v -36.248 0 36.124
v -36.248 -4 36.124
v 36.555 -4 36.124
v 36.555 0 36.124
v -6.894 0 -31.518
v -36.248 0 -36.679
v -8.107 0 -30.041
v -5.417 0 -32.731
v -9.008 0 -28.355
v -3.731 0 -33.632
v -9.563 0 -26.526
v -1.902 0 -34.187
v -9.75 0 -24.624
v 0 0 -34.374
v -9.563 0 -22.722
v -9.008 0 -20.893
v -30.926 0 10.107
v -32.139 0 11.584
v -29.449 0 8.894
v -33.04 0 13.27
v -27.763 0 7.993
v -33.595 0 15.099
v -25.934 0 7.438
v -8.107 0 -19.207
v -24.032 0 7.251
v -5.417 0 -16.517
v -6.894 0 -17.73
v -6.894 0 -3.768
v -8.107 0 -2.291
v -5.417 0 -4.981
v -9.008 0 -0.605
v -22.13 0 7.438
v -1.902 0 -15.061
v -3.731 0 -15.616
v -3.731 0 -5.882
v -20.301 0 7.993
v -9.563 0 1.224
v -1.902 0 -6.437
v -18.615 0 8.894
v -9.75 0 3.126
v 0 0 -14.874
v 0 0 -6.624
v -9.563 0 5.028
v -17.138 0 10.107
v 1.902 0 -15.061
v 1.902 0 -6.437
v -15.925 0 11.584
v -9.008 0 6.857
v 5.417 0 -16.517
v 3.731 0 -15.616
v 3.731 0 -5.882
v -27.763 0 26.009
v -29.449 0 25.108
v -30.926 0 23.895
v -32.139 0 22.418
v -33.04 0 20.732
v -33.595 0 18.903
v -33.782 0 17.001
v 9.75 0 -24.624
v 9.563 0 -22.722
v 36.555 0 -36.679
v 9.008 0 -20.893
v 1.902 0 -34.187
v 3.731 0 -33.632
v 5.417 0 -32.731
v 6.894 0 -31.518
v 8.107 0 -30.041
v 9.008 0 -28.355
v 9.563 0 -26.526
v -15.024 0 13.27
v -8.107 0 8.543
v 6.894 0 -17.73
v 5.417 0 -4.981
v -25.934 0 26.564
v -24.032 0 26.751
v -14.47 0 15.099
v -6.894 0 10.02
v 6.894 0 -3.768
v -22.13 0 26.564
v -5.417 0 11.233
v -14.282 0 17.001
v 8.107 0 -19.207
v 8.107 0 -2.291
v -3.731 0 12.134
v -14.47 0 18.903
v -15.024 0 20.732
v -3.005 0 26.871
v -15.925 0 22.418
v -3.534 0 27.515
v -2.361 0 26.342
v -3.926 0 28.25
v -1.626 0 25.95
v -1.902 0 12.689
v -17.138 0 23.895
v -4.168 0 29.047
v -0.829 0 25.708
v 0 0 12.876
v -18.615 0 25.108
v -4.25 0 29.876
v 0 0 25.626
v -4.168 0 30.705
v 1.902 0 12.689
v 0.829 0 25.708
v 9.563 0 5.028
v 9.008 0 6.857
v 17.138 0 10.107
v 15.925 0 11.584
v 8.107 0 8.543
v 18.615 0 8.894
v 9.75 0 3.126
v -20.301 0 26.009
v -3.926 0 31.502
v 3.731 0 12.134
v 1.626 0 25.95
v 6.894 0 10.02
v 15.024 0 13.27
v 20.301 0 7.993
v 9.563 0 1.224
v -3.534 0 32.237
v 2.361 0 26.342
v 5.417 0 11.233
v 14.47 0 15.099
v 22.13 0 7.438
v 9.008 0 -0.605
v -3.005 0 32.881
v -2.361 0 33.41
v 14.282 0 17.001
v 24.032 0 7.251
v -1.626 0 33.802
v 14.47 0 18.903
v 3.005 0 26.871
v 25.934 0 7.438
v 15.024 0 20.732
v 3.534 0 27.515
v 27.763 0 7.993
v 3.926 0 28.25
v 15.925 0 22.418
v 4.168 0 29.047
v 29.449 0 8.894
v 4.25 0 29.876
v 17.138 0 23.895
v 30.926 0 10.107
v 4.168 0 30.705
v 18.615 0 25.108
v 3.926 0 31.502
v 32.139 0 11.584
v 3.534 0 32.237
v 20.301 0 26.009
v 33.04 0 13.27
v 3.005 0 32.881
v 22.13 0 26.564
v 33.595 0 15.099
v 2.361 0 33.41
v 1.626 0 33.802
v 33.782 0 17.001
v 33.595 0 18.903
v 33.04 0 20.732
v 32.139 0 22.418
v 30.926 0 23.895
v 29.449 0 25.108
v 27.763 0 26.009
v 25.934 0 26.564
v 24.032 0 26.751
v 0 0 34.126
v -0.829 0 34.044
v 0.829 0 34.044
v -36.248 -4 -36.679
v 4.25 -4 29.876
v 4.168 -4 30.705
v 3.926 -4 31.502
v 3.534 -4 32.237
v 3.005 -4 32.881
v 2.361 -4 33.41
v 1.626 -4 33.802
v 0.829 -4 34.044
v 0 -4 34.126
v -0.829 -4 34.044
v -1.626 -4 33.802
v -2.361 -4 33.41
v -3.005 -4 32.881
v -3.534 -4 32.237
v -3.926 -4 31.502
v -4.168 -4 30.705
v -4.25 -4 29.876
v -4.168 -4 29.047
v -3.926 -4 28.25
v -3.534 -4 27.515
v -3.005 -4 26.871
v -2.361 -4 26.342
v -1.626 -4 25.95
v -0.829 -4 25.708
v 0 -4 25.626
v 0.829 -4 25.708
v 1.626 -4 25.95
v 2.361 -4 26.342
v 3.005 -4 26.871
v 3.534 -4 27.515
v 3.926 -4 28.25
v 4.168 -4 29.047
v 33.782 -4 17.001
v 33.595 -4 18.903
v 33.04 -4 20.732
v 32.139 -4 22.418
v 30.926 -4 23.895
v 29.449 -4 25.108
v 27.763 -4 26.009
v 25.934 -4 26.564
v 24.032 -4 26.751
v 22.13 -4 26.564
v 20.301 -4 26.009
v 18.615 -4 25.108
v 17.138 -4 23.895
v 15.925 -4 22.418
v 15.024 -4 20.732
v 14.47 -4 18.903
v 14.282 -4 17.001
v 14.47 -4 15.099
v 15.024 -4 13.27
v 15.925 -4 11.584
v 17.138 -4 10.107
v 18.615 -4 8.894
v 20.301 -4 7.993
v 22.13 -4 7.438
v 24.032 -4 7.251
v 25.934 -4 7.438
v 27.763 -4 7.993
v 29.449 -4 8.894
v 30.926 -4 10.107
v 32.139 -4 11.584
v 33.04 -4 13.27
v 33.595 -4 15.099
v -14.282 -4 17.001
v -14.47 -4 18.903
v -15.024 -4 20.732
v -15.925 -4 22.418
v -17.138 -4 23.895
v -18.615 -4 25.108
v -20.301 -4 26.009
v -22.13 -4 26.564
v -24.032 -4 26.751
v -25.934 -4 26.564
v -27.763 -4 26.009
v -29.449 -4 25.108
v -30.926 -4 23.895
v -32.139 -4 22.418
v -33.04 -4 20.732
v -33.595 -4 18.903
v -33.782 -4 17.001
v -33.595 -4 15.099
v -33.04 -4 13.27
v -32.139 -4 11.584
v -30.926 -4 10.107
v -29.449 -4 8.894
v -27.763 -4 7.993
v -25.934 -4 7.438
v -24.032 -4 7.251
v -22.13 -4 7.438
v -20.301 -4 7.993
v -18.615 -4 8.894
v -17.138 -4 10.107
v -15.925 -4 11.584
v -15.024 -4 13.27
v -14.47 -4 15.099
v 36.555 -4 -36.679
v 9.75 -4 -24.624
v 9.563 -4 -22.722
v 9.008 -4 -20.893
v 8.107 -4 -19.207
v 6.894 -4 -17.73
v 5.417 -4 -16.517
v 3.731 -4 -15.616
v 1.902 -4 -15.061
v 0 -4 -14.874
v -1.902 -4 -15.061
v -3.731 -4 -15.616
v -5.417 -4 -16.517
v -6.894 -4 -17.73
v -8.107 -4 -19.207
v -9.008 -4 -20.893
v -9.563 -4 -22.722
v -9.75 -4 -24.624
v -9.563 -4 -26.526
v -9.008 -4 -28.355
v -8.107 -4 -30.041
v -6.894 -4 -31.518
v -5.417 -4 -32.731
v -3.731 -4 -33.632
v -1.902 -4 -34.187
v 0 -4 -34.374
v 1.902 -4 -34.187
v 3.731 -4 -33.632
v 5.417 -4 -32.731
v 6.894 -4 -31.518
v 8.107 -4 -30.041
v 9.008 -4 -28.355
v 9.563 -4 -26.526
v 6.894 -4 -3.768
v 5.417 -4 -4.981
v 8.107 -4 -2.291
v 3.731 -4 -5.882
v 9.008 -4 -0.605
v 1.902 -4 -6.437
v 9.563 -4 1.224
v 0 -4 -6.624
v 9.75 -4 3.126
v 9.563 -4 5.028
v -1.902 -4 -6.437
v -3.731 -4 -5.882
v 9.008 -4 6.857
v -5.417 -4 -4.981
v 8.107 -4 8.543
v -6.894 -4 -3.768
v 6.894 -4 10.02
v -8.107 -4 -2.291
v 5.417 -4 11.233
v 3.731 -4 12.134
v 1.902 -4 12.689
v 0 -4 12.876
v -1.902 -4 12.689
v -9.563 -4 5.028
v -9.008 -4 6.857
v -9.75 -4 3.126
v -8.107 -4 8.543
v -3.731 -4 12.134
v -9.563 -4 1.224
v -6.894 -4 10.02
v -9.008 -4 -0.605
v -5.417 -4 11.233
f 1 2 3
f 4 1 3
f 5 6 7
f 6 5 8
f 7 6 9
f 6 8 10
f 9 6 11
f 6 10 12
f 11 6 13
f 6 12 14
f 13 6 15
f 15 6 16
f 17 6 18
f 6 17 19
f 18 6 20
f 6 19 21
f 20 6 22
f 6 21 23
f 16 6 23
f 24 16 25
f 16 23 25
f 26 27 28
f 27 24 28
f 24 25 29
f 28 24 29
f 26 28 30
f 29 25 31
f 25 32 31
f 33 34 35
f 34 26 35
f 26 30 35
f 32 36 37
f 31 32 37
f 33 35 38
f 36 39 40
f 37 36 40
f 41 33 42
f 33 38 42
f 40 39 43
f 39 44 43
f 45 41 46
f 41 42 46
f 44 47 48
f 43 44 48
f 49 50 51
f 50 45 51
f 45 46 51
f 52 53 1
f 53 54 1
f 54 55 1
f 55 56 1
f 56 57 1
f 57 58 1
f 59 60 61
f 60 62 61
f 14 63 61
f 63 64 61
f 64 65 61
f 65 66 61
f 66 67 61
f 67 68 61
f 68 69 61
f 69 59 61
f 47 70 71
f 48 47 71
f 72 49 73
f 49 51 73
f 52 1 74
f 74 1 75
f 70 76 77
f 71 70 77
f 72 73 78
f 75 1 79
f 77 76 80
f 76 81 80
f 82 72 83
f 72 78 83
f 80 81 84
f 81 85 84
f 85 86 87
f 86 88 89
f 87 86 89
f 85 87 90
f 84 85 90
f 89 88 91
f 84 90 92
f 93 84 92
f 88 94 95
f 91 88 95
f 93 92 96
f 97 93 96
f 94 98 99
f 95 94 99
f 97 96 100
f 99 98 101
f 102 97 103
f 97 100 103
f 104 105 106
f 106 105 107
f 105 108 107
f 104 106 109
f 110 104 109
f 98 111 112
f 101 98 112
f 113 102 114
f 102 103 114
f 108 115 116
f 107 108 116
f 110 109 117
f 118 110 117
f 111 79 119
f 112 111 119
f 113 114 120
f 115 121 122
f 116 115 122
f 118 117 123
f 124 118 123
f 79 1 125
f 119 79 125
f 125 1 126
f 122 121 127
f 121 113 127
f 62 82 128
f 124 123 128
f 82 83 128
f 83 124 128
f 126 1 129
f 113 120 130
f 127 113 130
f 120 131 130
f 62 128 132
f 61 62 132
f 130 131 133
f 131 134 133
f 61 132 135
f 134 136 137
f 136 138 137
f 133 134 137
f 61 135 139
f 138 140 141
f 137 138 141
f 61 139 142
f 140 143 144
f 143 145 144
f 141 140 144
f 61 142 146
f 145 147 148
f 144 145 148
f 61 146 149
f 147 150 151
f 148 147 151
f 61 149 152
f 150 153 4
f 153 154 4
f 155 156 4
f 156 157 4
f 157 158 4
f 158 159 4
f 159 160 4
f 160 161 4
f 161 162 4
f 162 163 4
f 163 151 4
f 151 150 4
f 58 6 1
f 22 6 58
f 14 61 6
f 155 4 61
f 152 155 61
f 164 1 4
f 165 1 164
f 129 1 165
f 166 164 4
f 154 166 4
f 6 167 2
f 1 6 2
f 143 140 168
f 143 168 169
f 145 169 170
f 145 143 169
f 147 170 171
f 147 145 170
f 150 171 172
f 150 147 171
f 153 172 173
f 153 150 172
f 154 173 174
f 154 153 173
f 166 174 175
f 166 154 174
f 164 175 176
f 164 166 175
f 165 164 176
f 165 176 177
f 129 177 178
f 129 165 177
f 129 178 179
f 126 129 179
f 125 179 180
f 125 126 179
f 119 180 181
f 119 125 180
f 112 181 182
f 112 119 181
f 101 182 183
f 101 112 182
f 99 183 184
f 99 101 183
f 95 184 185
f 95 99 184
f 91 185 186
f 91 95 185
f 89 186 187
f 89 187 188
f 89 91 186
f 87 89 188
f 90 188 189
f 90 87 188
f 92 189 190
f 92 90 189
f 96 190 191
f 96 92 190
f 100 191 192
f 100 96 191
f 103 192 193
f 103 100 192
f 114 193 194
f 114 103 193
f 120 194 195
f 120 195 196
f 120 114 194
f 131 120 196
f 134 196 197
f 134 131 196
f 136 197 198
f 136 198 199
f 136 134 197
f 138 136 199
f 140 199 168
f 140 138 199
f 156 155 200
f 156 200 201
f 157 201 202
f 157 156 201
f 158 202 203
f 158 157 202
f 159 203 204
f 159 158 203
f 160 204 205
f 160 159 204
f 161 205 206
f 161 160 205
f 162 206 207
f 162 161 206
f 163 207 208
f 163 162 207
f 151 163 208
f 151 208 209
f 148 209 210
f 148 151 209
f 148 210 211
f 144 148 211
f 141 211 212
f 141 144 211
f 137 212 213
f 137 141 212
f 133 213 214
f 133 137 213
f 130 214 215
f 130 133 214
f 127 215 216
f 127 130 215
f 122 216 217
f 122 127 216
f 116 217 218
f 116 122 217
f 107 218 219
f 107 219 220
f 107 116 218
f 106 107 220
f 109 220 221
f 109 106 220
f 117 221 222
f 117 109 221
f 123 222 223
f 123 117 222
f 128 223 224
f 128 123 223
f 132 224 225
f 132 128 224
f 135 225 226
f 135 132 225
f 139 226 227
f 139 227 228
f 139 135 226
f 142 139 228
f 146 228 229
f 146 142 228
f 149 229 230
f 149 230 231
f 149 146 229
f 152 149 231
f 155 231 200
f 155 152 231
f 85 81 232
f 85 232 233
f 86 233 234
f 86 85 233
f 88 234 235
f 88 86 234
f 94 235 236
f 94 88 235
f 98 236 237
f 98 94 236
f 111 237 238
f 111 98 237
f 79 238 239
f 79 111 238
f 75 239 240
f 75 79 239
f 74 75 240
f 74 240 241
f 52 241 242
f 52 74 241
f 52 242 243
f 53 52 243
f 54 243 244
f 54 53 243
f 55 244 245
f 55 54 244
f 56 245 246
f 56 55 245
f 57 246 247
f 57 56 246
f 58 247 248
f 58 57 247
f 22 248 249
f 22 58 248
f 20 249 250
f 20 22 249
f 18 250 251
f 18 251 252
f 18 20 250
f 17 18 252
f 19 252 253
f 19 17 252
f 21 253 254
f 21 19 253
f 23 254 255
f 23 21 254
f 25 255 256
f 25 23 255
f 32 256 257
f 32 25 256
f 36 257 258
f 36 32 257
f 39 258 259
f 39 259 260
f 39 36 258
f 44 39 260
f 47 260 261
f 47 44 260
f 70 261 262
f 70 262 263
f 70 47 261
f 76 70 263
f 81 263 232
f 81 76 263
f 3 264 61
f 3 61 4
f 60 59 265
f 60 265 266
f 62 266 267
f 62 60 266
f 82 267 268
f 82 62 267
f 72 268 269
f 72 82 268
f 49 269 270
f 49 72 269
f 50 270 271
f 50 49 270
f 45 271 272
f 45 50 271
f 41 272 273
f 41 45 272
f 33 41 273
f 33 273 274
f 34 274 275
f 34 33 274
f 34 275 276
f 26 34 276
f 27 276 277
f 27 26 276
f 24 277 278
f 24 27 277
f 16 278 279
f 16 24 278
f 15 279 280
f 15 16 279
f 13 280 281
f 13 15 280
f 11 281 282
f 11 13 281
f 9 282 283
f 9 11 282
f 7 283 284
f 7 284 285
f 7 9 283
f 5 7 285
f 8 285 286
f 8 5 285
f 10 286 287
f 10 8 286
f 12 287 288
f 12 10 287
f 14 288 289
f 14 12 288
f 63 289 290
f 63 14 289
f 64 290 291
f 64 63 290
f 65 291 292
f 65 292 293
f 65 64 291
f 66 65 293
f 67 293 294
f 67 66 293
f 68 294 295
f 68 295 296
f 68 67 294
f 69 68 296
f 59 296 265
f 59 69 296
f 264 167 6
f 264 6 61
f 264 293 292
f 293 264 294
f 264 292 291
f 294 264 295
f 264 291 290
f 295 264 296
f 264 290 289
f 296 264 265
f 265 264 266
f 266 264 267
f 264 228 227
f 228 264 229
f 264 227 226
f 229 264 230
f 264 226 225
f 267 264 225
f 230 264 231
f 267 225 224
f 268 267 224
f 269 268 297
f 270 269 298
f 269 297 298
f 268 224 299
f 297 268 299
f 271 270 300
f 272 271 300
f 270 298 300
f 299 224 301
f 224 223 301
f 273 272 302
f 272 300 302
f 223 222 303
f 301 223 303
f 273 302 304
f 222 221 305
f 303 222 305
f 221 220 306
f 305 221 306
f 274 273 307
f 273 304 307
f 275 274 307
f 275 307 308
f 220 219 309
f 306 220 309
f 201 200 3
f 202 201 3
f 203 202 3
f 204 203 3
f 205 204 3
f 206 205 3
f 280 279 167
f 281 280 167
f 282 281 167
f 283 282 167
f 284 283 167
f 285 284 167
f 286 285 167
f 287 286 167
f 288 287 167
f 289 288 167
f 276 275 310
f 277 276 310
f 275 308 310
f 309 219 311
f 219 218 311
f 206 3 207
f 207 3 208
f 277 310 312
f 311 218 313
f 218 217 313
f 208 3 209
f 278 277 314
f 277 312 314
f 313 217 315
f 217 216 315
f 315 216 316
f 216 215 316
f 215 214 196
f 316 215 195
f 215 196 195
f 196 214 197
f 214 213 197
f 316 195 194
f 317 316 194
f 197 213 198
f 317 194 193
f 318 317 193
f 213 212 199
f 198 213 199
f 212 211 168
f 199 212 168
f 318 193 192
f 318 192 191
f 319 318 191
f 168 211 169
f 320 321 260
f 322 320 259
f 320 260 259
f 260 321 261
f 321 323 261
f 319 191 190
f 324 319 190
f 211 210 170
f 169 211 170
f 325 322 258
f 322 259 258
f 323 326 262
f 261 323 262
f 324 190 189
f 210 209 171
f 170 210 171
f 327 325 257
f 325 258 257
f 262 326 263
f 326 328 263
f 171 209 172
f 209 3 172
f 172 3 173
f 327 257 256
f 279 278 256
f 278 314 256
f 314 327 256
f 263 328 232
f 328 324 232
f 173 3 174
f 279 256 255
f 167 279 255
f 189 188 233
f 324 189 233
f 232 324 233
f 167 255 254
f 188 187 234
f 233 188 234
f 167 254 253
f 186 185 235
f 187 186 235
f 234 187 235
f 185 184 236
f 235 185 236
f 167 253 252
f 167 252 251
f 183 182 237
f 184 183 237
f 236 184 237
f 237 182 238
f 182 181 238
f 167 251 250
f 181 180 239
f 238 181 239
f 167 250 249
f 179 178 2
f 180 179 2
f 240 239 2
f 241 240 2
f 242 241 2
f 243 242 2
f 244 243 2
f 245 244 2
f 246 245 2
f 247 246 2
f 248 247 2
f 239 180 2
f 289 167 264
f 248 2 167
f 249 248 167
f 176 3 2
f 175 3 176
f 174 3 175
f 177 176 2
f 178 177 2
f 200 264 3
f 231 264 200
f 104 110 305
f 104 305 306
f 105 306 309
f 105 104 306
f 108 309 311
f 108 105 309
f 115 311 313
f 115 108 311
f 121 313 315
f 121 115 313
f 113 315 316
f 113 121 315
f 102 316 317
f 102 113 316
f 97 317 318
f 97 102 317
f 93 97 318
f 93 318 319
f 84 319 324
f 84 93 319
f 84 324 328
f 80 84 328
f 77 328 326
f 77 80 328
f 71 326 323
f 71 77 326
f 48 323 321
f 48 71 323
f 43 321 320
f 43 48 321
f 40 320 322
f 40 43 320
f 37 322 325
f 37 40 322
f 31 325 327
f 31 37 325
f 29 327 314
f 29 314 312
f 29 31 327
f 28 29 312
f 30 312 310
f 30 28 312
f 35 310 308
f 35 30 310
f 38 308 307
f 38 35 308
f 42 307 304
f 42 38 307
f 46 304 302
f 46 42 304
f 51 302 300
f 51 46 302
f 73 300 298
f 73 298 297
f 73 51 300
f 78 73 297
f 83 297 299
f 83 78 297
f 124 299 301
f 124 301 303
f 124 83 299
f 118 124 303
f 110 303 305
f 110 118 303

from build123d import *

# Parameters (mm, degrees)
F0_W      = 80
F0_H      = 120
F0_R      = 9.75
F0_R_2    = 4.25
F1_DEPTH  = 4
F3_W      = 80
F3_H      = 20
F4_DEPTH  = 10
F5_W      = 6
F5_H      = 6
F5_R      = 0.95
F6_DEPTH  = 10
F7_R      = 2.99999
F11_W     = 97.9346781969
F11_H     = 127.8536170721
F11_W_2   = 72.8027671576
F11_H_2   = 72.8027634323
F12_DEPTH = 10


# Not quite as in the source:
# - a fillet or chamfer is up to 0.001 mm smaller than in the source, because OpenCascade refuses the exact size


with BuildPart() as f1:
    # F0 (on Front) → F1 (new body)
    with BuildSketch(Plane.XZ):
        Rectangle(F0_W, F0_H)
        with Locations((0, -24.624)):
            Circle(F0_R, mode=Mode.SUBTRACT)
        with Locations((-24.032204955, 17.001)):
            Circle(F0_R, mode=Mode.SUBTRACT)
        with Locations((0, 3.126)):
            Circle(F0_R, mode=Mode.SUBTRACT)
        with Locations((0, 29.876)):
            Circle(F0_R_2, mode=Mode.SUBTRACT)
        with Locations((24.032204955, 17.001)):
            Circle(F0_R, mode=Mode.SUBTRACT)
    extrude(amount=F1_DEPTH)

    # F3 (on face) → F4 (cut)
    with BuildSketch(Plane.XZ.offset(4)):
        with Locations((0, -50)):
            Rectangle(F3_W, F3_H)
    extrude(amount=-F4_DEPTH, mode=Mode.SUBTRACT)

    # F8: F6 across plane


with BuildPart() as f6:
    # F5 (on face) → F6 (new body)
    with BuildSketch(Plane.XZ.offset(4)):
        with Locations((43, 3)):
            Rectangle(F5_W, F5_H)
        with Locations((42.5, 3.126)):
            Circle(F5_R, mode=Mode.SUBTRACT)
    extrude(amount=-F6_DEPTH)

    # F7 (radius 3 in the source; OpenCascade refuses exactly that, so slightly less here)
    f7_edges = [f6.edges().sort_by_distance(p)[0] for p in [
        (46, 1, 0),
        (46, 1, 6),
    ]]
    fillet(f7_edges, radius=F7_R)


with BuildPart() as f1_1:
    add(f1.part)
    add(f6.part.mirror(Plane.YZ))


with BuildPart() as f12_tool:
    # F11 (on face) → F12 (new body)
    with BuildSketch(Plane.XZ.offset(4)):
        with Locations((1.1506490409, -1.4746189117)):
            Rectangle(F11_W, F11_H)
        with Locations((0.1533515751, -0.2778600901)):
            Rectangle(F11_W_2, F11_H_2, mode=Mode.SUBTRACT)
    extrude(amount=-F12_DEPTH)


with BuildPart() as f1_2:
    add(f1_1.part)

    # F12: cut by f12_tool
    add(f12_tool.part, mode=Mode.SUBTRACT)


with BuildPart() as f6_1:
    add(f6.part)

    # F12: cut by f12_tool
    add(f12_tool.part, mode=Mode.SUBTRACT)


solid = f1_2.part
